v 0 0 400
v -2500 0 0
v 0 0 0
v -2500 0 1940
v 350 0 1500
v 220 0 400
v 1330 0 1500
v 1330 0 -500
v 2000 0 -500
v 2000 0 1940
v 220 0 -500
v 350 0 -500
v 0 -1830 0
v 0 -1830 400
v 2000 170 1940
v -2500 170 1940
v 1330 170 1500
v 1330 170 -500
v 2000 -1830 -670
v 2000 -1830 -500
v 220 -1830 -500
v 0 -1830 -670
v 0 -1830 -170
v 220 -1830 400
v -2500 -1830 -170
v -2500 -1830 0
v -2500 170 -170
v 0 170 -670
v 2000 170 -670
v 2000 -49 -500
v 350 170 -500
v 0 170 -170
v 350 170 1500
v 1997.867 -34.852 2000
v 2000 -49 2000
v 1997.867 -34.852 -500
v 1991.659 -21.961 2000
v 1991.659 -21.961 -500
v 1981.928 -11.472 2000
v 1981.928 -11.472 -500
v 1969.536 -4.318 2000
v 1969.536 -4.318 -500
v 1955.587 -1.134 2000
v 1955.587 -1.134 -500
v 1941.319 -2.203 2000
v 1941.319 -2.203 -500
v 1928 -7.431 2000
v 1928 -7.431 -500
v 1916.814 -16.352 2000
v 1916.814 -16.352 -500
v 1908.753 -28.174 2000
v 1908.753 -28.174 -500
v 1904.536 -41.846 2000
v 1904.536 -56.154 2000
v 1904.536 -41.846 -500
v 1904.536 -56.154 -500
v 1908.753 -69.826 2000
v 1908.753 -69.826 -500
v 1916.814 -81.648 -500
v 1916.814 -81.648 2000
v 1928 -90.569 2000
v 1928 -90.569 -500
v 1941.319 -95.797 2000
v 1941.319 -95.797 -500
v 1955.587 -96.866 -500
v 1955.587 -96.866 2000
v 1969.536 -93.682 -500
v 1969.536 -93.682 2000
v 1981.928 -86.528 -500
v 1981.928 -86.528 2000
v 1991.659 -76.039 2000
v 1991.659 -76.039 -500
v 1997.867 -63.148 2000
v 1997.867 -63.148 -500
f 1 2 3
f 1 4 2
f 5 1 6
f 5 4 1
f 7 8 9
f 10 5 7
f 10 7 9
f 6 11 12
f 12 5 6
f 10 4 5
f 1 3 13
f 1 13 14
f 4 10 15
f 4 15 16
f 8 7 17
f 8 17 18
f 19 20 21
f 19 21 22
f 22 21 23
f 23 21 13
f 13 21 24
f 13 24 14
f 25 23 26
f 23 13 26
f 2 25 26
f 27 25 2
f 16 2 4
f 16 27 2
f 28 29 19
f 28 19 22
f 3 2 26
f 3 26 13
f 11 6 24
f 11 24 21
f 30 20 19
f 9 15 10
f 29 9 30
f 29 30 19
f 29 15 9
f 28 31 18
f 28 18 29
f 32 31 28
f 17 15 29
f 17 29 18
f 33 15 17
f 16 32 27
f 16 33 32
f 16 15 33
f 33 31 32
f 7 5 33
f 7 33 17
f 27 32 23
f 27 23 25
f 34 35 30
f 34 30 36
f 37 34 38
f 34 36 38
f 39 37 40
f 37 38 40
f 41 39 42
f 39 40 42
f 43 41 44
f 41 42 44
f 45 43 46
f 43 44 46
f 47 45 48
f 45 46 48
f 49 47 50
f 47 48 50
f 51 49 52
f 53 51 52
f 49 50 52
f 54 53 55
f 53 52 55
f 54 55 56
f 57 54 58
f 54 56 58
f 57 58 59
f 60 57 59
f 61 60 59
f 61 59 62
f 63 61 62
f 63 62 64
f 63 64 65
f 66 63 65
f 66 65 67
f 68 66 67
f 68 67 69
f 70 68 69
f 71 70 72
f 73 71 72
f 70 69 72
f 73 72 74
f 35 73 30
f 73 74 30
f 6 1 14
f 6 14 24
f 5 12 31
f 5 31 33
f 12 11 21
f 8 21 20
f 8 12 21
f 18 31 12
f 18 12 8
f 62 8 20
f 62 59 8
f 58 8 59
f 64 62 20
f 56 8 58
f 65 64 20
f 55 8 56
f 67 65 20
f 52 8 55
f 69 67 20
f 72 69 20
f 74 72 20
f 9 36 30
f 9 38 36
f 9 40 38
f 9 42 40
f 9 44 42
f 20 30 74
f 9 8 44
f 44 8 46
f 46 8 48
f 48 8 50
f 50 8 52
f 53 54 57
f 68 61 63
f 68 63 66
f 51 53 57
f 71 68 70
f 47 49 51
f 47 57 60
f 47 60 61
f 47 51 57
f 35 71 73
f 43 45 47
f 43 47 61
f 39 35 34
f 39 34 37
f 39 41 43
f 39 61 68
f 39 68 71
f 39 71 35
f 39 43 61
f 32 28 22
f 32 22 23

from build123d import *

# Parameters (mm, degrees)
F1_DEPTH = 170
F3_DEPTH = 2000
F4_R     = 48
F5_DEPTH = 2500


with BuildPart() as f1:
    # F0 (on Front) → F1 (new body)
    with BuildSketch(Plane.XZ):
        Polygon((-2500, 0), (0, 0), (0, 400), (220, 400), (220, -500), (350, -500), (350, 1500), (1330, 1500), (1330, -500), (2000, -500), (2000, 1940), (-2500, 1940), align=None)
    extrude(amount=-F1_DEPTH)

    # F2 (on face) → F3 (join)
    with BuildSketch(Plane(origin=(0, 170, 0), x_dir=(-1, 0, 0), z_dir=(0, 1, 0))):
        Polygon((2500, -170), (2500, 0), (0, 0), (0, 400), (-220, 400), (-220, -500), (-2000, -500), (-2000, -670), (0, -670), (0, -170), align=None)
    extrude(amount=-F3_DEPTH)

    # F4 (on face) → F5 (join)
    with BuildSketch(Plane.XY.offset(-500)):
        with Locations((1952, -49)):
            Circle(F4_R)
    extrude(amount=F5_DEPTH)


solid = f1.part
